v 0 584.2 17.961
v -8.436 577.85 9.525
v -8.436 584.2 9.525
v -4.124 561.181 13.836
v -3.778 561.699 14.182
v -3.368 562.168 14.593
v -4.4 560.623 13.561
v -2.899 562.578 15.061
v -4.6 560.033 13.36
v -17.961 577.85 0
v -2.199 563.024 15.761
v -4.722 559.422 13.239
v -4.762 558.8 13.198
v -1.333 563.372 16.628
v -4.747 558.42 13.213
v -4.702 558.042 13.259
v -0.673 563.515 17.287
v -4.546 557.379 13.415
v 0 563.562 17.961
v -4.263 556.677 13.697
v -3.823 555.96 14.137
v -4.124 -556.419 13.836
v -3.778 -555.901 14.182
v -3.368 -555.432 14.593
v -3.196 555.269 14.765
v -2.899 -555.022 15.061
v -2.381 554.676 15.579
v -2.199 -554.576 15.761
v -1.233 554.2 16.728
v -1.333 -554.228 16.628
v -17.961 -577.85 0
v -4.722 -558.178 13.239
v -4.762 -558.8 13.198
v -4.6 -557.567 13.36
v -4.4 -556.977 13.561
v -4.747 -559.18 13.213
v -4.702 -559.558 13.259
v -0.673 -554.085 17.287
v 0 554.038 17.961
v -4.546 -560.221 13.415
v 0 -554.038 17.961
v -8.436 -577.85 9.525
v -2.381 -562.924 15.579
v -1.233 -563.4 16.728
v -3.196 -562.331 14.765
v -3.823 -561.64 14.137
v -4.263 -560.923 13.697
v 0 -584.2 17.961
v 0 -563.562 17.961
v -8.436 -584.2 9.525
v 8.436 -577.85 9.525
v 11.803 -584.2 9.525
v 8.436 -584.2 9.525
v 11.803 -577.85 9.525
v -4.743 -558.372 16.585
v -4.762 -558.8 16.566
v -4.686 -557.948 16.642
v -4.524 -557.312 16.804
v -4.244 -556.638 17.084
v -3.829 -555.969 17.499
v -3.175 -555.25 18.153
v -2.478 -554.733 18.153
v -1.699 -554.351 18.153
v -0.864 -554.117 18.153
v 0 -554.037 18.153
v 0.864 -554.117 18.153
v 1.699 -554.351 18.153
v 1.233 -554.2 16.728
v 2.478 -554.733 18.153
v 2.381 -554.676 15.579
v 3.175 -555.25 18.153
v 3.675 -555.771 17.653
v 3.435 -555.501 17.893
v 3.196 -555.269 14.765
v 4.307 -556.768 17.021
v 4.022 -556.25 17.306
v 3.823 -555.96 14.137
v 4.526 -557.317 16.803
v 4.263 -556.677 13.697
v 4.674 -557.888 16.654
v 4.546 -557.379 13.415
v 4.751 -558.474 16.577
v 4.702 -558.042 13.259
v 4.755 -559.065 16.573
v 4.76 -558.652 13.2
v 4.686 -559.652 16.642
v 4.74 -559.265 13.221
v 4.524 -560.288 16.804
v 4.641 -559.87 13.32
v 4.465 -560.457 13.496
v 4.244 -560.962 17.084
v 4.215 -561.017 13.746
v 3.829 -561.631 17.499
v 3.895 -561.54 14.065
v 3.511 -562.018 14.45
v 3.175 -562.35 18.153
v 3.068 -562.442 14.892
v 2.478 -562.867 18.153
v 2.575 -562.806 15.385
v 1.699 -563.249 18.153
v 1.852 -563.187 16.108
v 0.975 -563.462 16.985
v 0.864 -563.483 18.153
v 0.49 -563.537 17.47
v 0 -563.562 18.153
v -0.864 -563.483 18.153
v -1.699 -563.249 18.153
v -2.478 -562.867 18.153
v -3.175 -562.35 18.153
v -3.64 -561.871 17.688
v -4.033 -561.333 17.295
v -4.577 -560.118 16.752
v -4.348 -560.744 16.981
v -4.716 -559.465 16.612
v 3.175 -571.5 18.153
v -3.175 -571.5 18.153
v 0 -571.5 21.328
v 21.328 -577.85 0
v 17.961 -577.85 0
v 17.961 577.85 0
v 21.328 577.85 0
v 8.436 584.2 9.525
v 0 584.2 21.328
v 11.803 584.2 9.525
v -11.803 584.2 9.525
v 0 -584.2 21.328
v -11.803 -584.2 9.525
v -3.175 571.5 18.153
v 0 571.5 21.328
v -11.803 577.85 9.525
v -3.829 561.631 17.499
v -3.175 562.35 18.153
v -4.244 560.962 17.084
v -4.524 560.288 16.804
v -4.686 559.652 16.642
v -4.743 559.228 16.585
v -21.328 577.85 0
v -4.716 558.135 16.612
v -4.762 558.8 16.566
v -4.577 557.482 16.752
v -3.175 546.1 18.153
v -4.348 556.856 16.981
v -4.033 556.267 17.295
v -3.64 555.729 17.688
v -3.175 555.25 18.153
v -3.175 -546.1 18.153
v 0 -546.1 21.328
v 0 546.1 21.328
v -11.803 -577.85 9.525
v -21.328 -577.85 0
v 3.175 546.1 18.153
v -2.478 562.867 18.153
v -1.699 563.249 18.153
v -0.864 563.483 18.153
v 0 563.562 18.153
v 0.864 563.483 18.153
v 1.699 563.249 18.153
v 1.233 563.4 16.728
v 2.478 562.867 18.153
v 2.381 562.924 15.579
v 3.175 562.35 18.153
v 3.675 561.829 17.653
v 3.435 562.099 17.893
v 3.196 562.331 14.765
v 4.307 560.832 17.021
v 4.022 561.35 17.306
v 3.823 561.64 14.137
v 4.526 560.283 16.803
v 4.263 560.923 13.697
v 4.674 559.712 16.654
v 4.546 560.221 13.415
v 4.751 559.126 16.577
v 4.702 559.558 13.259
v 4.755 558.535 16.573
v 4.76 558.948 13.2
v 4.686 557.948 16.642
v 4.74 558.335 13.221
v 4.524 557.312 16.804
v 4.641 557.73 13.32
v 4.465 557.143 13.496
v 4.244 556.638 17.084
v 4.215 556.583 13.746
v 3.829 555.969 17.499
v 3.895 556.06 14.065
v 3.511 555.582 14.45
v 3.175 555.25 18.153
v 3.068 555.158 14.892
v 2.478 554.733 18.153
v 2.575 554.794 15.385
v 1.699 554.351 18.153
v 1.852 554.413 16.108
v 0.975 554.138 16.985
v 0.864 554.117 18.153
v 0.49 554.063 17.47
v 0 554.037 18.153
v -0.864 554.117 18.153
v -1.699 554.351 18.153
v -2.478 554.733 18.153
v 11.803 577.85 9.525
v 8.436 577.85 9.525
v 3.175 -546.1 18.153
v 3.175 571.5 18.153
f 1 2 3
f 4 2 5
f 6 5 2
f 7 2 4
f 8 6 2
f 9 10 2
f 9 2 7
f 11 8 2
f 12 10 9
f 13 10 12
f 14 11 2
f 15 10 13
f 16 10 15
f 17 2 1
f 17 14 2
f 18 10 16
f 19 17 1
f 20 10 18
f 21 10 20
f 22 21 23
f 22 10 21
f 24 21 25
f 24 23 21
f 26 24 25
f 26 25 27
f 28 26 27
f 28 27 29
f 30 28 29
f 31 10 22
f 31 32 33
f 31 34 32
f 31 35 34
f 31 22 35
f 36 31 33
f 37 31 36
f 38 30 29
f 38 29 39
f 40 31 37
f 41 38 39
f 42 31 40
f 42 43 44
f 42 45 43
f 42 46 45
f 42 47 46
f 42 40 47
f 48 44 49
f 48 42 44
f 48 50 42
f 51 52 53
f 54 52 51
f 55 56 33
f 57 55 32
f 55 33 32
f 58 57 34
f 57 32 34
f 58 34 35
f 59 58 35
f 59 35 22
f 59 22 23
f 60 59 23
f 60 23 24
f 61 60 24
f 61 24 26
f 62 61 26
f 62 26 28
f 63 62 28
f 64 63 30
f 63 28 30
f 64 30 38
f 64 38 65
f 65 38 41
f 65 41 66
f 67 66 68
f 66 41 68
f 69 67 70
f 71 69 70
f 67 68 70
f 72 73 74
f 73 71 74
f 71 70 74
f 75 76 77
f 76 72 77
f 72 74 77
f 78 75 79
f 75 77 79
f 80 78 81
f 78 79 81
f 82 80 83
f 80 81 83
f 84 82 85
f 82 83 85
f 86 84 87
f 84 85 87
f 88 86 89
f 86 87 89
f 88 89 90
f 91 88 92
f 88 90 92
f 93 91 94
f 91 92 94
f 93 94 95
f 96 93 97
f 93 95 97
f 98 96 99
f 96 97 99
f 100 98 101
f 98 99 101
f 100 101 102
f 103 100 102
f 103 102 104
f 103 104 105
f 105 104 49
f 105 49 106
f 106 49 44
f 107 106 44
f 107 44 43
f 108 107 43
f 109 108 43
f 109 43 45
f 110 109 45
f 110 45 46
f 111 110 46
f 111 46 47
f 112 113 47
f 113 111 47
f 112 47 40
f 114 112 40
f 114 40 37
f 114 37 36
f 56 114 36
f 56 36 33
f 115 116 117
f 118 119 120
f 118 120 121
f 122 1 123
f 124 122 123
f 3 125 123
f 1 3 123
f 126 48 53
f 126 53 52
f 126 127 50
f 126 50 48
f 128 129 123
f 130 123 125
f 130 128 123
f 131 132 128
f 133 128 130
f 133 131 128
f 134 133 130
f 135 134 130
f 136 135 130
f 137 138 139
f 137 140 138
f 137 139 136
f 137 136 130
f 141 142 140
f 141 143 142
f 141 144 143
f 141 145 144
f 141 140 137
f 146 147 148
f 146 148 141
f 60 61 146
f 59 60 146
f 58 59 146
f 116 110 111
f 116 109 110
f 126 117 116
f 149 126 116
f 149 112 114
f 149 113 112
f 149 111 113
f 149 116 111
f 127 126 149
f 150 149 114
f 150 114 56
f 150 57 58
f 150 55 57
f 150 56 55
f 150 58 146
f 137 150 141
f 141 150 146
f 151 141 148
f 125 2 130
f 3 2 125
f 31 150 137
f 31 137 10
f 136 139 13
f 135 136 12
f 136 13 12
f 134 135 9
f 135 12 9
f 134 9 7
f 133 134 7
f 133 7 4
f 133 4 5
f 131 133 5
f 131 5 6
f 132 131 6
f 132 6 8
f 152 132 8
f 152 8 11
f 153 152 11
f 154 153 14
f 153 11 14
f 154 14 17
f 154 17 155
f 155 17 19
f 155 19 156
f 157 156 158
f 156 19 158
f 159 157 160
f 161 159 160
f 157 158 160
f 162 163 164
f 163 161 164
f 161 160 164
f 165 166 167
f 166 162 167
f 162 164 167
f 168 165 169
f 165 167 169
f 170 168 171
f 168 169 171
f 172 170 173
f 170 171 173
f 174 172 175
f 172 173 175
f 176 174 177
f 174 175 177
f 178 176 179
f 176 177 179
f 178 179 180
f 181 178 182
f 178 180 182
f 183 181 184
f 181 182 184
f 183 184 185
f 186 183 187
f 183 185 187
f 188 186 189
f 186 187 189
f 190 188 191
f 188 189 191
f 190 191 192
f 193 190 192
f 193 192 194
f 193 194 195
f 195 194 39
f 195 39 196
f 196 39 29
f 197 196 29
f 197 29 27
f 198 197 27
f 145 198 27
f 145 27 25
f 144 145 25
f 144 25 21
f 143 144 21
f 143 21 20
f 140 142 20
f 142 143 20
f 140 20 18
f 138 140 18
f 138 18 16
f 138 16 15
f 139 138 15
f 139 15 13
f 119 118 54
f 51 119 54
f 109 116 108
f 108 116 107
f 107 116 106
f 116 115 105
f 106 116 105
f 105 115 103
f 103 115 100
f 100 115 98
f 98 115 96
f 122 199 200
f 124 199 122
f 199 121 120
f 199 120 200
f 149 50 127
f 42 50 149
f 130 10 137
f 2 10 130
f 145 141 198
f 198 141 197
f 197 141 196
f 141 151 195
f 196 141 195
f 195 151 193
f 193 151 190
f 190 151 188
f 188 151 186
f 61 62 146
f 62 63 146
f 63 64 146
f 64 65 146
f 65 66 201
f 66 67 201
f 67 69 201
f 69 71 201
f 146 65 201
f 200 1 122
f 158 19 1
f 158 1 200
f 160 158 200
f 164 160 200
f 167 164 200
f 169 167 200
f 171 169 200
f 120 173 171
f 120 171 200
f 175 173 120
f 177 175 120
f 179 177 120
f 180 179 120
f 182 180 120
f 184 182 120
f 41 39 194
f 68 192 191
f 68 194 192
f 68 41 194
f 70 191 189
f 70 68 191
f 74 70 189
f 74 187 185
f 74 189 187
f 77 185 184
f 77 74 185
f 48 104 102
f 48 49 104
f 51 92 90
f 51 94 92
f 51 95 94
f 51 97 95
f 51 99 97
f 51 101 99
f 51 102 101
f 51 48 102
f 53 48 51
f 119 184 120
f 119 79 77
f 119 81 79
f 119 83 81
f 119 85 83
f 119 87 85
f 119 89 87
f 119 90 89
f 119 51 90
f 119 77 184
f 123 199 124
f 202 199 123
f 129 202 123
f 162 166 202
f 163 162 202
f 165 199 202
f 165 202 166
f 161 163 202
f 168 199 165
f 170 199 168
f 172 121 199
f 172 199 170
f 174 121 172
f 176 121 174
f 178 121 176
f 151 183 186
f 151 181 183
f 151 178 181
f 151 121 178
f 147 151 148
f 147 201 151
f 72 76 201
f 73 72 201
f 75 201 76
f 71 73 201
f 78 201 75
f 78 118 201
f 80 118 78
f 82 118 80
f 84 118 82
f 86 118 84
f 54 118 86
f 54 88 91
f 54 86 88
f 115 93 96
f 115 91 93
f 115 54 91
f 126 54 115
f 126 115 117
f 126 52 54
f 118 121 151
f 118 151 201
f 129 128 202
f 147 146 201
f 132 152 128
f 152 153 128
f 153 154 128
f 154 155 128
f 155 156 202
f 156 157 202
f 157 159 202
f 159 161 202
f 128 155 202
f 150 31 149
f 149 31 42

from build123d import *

# Parameters (mm, degrees)
F1_DEPTH = 584.2
F3_W     = 25.4
F3_H     = 3.175
F3_W_2   = 6.35
F3_H_2   = 9.525
F4_DEPTH = 68.58
F6_D     = 9.525


with BuildPart() as f1:
    # F0 (on Front) → F1 (new body, symmetric)
    with BuildSketch(Plane.XZ):
        Polygon((17.960512, 0), (21.328108, 0), (0, 21.328108), (-21.328108, 0), (-17.960512, 0), (0, 17.960512), align=None)
    extrude(amount=F1_DEPTH, both=True)

    # F3 (on offset) → F4 (cut)
    with BuildSketch(Plane.YZ.offset(37.592)):
        with Locations((-558.8, 19.740608)):
            Rectangle(F3_W, F3_H)
        with Locations((558.8, 19.740608)):
            Rectangle(F3_W, F3_H)
        with Locations((581.025, 4.7625)):
            Rectangle(F3_W_2, F3_H_2)
        with Locations((-581.025, 4.7625)):
            Rectangle(F3_W_2, F3_H_2)
    extrude(amount=-F4_DEPTH, mode=Mode.SUBTRACT)

    # F6 (through all)
    with Locations(Plane.XY.offset(18.153108)):
        with Locations((0, -558.8), (0, 558.8)):
            Hole(F6_D / 2)


solid = f1.part
